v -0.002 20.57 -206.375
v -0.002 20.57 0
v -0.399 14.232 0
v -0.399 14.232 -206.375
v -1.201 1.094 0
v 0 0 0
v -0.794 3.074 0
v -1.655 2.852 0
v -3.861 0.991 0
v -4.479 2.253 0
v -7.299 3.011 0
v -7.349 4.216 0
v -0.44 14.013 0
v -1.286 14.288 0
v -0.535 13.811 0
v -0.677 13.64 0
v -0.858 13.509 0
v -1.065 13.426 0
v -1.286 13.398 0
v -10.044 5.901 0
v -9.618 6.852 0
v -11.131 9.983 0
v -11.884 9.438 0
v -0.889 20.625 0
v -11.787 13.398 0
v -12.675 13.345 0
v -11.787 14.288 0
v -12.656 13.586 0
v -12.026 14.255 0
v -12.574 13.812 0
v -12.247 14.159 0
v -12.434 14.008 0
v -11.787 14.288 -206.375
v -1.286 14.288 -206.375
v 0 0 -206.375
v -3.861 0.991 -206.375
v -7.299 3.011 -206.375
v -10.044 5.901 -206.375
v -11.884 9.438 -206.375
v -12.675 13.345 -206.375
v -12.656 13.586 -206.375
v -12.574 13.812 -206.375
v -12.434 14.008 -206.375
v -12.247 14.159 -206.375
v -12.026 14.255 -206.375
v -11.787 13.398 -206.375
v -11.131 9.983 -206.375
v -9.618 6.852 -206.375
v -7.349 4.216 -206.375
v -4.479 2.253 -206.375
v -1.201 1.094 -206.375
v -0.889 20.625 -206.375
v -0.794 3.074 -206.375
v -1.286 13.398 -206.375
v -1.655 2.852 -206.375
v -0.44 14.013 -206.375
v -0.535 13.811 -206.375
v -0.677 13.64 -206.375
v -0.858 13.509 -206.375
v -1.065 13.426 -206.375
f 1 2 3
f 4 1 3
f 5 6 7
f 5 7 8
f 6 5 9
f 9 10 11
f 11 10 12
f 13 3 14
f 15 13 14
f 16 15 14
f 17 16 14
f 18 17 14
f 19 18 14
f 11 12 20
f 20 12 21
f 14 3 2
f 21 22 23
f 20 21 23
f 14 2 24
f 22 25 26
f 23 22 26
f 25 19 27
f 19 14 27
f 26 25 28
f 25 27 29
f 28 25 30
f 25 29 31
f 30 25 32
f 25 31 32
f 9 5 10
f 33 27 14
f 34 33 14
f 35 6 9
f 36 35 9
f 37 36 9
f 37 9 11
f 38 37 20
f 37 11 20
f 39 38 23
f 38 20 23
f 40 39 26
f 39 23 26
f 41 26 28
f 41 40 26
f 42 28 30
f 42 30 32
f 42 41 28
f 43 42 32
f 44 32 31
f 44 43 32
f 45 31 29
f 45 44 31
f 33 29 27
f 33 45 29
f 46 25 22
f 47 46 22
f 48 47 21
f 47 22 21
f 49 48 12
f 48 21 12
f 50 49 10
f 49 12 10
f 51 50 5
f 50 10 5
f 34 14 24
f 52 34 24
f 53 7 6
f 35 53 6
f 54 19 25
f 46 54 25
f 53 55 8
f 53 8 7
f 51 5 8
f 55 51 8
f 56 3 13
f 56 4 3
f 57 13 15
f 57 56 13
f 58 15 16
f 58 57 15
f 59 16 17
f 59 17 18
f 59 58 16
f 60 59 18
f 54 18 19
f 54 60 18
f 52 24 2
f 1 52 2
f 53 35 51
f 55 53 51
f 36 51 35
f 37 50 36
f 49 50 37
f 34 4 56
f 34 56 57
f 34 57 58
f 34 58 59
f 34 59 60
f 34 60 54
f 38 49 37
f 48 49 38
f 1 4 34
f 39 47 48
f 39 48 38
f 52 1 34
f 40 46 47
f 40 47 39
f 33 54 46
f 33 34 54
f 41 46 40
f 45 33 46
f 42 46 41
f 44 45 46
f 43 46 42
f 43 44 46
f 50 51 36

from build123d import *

# Parameters (mm, degrees)
EXTRUDE_THIN1_DEPTH = 206.375
FILLET1_R           = 0.889


with BuildPart() as part:
    # Sketch1 → Extrude-Thin1 (new body)
    with BuildSketch(Plane.XY):
        with BuildLine():
            Line((-0.79375, 3.074180531), (0, 0))
            ThreePointArc((0, 0), (-9.091384352, 4.706963909), (-12.7, 14.2875))
            Line((-12.7, 14.2875), (-1.285875, 14.2875))
            Line((-1.285875, 14.2875), (-0.889, 20.625085521))
            Line((-0.889, 20.625085521), (-0.001738027, 20.569523021))
            Line((-0.001738027, 20.569523021), (-0.450804908, 13.3985))
            Line((-0.450804908, 13.3985), (-11.787335474, 13.3985))
            ThreePointArc((-11.787335474, 13.3985), (-8.569392416, 5.460475486), (-1.20057239, 1.093796873))
            Line((-1.20057239, 1.093796873), (-1.654520549, 2.851930531))
            Line((-1.654520549, 2.851930531), (-0.79375, 3.074180531))
        make_face()
    extrude(amount=-EXTRUDE_THIN1_DEPTH)

    # Fillet1
    fillet1_edges = [part.edges().sort_by_distance(p)[0] for p in [
        (-0.450804908, 13.3985, -103.1875),
        (-12.7, 14.2875, -103.1875),
    ]]
    fillet(fillet1_edges, radius=FILLET1_R)


solid = part.part
